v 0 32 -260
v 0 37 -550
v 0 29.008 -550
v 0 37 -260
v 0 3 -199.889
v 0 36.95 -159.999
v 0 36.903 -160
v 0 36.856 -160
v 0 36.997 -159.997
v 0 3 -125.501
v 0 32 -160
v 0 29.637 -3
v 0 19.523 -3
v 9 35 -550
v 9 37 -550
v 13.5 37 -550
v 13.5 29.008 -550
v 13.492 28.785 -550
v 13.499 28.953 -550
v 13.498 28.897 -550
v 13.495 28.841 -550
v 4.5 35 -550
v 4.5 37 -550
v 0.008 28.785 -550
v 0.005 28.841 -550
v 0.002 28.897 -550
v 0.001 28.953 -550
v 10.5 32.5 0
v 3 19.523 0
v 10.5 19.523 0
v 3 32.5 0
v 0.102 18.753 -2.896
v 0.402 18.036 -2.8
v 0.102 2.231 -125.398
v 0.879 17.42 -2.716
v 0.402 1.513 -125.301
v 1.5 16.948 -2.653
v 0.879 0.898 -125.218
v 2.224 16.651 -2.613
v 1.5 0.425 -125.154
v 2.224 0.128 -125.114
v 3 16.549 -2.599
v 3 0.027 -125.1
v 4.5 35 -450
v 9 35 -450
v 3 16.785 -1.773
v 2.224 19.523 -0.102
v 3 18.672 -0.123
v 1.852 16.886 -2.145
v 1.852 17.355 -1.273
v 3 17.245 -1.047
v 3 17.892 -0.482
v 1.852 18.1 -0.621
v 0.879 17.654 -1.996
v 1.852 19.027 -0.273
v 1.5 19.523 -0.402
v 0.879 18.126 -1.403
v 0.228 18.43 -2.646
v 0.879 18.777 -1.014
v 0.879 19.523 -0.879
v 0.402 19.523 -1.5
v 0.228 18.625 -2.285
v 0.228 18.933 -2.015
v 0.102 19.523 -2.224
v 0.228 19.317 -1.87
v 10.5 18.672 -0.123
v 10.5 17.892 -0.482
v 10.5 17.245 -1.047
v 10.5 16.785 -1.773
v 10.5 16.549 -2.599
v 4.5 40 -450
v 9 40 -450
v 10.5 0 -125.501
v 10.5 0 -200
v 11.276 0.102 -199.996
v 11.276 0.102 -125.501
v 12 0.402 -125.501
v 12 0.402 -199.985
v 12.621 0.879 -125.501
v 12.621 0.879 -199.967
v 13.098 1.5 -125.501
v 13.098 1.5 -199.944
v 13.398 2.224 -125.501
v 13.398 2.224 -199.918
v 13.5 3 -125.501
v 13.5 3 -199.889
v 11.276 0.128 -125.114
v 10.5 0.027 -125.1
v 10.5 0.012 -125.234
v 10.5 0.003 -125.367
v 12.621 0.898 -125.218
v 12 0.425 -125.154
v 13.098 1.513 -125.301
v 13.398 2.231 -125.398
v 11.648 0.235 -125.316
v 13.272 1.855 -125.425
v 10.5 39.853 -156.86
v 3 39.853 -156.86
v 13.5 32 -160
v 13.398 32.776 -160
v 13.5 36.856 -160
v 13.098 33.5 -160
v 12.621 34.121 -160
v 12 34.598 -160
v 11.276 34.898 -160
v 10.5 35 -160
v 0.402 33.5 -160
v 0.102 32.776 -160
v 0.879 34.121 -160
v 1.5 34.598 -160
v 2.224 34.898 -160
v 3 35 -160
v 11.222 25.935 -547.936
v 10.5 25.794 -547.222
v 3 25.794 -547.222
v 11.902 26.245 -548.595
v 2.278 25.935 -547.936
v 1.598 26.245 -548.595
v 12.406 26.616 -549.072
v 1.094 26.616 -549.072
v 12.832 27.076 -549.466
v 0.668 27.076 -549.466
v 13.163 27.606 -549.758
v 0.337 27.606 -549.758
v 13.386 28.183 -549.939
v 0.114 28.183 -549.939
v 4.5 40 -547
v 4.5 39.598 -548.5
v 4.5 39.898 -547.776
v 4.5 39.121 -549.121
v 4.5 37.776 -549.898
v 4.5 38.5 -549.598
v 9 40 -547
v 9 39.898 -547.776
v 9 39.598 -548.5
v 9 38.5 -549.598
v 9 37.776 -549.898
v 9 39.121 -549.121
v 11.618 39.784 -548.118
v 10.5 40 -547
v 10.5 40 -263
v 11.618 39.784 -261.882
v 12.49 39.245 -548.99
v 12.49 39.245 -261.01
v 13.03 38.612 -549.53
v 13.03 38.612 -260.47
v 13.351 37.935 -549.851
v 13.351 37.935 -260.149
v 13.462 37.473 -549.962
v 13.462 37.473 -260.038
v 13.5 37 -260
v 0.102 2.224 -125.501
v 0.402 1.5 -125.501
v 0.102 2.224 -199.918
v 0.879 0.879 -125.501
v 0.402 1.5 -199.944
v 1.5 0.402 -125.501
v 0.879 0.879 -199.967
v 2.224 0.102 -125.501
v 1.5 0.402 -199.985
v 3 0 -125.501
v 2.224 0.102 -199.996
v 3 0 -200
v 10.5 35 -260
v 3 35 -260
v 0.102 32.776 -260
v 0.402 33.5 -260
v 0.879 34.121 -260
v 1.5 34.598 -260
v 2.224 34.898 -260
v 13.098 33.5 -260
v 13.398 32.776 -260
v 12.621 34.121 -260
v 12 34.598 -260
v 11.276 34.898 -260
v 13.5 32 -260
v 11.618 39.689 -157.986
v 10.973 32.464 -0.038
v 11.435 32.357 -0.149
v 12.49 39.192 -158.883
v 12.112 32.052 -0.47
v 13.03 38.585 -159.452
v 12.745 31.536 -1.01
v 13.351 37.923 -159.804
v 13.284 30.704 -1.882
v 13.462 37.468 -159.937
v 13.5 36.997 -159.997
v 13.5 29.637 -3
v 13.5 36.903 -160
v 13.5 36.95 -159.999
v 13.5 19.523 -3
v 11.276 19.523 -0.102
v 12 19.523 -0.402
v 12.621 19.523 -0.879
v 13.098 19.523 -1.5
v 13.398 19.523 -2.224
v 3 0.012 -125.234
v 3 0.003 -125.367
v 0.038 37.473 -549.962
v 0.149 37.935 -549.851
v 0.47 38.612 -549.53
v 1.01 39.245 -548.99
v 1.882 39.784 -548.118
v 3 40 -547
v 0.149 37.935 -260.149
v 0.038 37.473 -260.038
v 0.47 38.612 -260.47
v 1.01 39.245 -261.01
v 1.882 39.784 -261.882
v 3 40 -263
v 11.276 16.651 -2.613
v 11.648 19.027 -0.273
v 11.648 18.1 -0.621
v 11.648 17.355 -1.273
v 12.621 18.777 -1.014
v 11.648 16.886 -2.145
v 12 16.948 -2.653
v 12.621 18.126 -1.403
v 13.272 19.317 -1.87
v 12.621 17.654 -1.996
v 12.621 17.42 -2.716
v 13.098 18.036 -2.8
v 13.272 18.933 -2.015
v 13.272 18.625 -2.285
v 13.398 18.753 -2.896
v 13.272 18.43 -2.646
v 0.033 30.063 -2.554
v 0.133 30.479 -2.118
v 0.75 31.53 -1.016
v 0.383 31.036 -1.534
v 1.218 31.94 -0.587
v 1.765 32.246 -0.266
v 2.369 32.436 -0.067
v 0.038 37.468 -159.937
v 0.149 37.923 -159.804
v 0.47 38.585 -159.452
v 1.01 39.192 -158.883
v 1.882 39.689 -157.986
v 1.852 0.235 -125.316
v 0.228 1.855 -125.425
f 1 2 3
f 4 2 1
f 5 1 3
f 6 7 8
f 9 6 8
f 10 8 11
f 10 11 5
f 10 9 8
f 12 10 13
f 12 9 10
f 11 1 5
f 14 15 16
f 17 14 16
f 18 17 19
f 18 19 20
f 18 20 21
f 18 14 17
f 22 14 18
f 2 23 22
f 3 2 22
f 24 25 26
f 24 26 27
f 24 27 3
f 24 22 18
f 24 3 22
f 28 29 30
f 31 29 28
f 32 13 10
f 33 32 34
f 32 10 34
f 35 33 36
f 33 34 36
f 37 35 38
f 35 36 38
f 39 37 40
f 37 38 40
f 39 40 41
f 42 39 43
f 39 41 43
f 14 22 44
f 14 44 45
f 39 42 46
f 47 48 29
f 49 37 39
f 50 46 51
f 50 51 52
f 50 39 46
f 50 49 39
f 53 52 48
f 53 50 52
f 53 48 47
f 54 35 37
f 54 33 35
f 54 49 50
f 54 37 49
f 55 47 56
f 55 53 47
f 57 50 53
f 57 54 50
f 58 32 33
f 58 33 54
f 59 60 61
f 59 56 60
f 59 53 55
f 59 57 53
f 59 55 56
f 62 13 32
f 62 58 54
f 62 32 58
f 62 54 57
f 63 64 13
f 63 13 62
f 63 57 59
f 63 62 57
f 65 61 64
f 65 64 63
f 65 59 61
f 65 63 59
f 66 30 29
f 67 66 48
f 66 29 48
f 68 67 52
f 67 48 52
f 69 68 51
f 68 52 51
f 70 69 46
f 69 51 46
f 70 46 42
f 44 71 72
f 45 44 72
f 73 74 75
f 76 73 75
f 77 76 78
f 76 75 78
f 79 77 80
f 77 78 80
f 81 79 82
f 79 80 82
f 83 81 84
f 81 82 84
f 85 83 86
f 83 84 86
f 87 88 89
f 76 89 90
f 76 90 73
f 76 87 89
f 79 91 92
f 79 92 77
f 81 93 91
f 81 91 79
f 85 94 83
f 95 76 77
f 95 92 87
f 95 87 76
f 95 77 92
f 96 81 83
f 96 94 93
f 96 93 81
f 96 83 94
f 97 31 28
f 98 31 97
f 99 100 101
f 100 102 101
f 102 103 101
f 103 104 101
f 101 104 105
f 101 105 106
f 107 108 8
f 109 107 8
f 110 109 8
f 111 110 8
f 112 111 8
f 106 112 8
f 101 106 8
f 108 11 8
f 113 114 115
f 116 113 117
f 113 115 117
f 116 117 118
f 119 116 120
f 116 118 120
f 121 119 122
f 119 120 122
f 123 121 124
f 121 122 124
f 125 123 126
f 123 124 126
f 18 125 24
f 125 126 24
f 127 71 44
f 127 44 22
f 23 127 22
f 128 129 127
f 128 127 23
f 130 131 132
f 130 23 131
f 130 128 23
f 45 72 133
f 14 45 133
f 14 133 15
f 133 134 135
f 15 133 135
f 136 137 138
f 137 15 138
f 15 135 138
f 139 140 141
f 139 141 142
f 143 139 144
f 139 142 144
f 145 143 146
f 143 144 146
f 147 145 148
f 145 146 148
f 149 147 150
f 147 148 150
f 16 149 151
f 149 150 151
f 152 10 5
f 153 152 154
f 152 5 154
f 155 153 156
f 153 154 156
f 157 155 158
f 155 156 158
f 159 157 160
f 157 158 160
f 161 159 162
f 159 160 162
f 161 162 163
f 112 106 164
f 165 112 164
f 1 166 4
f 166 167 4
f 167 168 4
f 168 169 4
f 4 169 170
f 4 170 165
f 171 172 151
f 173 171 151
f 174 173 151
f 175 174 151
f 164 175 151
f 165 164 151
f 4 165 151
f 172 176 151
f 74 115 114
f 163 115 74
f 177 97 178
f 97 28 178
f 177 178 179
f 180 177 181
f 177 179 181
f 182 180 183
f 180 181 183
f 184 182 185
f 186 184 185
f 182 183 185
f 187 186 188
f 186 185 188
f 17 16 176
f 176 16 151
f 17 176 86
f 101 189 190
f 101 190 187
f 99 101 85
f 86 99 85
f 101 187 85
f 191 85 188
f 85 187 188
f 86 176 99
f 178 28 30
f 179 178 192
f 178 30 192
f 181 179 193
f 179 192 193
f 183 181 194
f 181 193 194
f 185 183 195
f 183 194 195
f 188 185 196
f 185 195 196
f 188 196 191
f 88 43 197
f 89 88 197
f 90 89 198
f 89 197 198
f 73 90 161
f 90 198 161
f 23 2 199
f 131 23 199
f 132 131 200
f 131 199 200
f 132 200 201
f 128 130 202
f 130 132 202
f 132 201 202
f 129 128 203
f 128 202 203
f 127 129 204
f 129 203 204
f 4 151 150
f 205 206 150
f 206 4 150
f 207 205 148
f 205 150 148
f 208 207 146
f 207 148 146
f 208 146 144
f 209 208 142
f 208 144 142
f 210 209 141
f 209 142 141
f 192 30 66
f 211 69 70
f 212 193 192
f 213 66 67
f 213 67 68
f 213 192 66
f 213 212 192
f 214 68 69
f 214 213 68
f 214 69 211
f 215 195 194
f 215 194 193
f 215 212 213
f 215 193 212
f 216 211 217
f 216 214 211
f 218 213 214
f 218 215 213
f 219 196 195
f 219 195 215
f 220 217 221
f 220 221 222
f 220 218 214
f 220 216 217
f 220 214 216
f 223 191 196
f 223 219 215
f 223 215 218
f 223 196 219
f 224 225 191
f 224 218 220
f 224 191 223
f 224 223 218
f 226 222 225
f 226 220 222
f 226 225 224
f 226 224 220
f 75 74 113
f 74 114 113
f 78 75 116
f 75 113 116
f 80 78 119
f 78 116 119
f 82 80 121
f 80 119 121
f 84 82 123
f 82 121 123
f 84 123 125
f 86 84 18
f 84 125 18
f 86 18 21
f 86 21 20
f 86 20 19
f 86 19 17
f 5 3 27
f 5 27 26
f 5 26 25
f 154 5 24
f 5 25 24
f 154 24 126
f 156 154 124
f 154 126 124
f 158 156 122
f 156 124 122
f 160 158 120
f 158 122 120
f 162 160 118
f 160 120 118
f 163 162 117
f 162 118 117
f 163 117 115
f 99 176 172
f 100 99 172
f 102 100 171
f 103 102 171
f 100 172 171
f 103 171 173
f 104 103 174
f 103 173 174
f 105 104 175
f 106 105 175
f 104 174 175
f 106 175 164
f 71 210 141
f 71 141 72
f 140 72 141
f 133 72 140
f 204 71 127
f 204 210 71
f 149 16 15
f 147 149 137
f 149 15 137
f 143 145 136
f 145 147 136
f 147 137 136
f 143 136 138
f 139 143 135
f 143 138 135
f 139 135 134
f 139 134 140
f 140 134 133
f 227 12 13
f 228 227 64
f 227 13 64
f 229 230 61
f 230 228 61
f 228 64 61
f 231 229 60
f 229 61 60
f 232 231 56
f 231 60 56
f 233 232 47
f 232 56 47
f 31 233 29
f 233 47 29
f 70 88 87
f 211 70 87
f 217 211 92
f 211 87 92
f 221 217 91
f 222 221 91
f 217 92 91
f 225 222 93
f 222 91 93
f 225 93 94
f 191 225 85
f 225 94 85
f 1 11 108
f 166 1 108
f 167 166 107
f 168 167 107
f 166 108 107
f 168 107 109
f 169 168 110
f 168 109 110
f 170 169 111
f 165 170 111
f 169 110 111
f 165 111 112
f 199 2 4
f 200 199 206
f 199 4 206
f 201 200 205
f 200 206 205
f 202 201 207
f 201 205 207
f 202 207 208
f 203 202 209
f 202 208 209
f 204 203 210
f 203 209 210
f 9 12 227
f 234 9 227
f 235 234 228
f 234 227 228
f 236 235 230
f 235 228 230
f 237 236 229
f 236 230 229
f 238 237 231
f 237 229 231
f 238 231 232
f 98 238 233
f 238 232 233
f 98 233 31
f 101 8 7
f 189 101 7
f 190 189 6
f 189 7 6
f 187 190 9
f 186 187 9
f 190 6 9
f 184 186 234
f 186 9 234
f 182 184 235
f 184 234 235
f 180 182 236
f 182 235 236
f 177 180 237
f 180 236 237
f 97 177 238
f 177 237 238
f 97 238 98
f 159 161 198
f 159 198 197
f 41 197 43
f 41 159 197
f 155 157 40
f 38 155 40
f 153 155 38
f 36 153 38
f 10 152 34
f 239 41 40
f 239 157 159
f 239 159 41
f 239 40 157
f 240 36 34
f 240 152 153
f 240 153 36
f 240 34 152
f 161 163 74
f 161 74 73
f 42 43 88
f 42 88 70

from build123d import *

# Parameters (mm, degrees)
BOSS_EXTRUDE1_DEPTH = 13.5
SKETCH2_W           = 100
SKETCH2_H           = 5
CUT_EXTRUDE1_DEPTH  = 552.61784779
SKETCH3_W           = 4.5
SKETCH3_H           = 100
CUT_EXTRUDE2_DEPTH  = 5
FILLET1_R           = 3


with BuildPart() as part:
    # Sketch1 → Boss-Extrude1 (new body)
    with BuildSketch(Plane(origin=(0, 0, 0), x_dir=(0, 0, -1), z_dir=(1, 0, 0))):
        Polygon((0, 16.9), (0, 32.5), (160, 40), (550, 40), (550, 26), (200, 0), (125.3, 0), align=None)
    extrude(amount=BOSS_EXTRUDE1_DEPTH)

    # Sketch2 → Cut-Extrude1 (cut, through all)
    with BuildSketch(Plane(origin=(13.5, 0, 0), x_dir=(0, 0, -1), z_dir=(1, 0, 0))):
        with Locations((210, 37.5)):
            Rectangle(SKETCH2_W, SKETCH2_H)
    extrude(amount=-CUT_EXTRUDE1_DEPTH, mode=Mode.SUBTRACT)

    # Sketch3 → Cut-Extrude2 (cut)
    with BuildSketch(Plane(origin=(0, 40, 0), x_dir=(1, 0, 0), z_dir=(0, 1, 0))):
        with Locations((6.75, 500)):
            Rectangle(SKETCH3_W, SKETCH3_H)
    extrude(amount=-CUT_EXTRUDE2_DEPTH, mode=Mode.SUBTRACT)

    # Fillet1
    # the kernel refuses this fillet: 3 mm, written as the material it takes off along each edge
    with BuildSketch(Plane(origin=(10.5, 3, -125.501402614), x_dir=(0, -1, 0), z_dir=(1, 0, 0))) as fillet1_piece_1_section:
        Polygon((0, 0), (FILLET1_R, 0), (FILLET1_R, -FILLET1_R * 0.0671342046123), (FILLET1_R * 0.991026440985, -FILLET1_R * 0.133665976478), align=None)
    fillet1_piece_1 = extrude(amount=FILLET1_R, mode=Mode.PRIVATE)
    fillet1_piece_1 = fillet1_piece_1 - Plane(origin=(10.5, 3, -125.501402614), x_dir=(0, 0.9977540881864227, -0.0669834271091007), z_dir=(1, 0, 0)) * Sphere(FILLET1_R, mode=Mode.PRIVATE)
    add(fillet1_piece_1, mode=Mode.SUBTRACT)
    with BuildSketch(Plane(origin=(10.5, 19.522535548, -3), x_dir=(0, 0, 1), z_dir=(1, 0, 0))) as fillet1_piece_2_section:
        Polygon((0, 0), (FILLET1_R, 0), (FILLET1_R, FILLET1_R * 0.874178516025), (FILLET1_R * 0.133665976478, FILLET1_R * 0.991026440985), align=None)
    fillet1_piece_2 = extrude(amount=FILLET1_R, mode=Mode.PRIVATE)
    fillet1_piece_2 = fillet1_piece_2 - Plane(origin=(10.5, 19.522535548, -3), x_dir=(0, 0.6581542461772603, -0.75288311724918), z_dir=(1, 0, 0)) * Sphere(FILLET1_R, mode=Mode.PRIVATE)
    add(fillet1_piece_2, mode=Mode.SUBTRACT)
    with BuildSketch(Plane(origin=(3, 3, -125.501402614), x_dir=(0, -1, 0), z_dir=(-1, 0, 0))) as fillet1_piece_3_section:
        Polygon((0, 0), (FILLET1_R, 0), (FILLET1_R, FILLET1_R * 0.0671342046123), (FILLET1_R * 0.991026440985, FILLET1_R * 0.133665976478), align=None)
    fillet1_piece_3 = extrude(amount=FILLET1_R, mode=Mode.PRIVATE)
    fillet1_piece_3 = fillet1_piece_3 - Plane(origin=(3, 3, -125.501402614), x_dir=(0, 0.9977540881864227, -0.0669834271091007), z_dir=(-1, 0, 0)) * Sphere(FILLET1_R, mode=Mode.PRIVATE)
    add(fillet1_piece_3, mode=Mode.SUBTRACT)
    with BuildSketch(Plane(origin=(3, 19.522535548, -3), x_dir=(0, 0, 1), z_dir=(-1, 0, 0))) as fillet1_piece_4_section:
        Polygon((0, 0), (FILLET1_R, 0), (FILLET1_R, -FILLET1_R * 0.874178516025), (FILLET1_R * 0.133665976478, -FILLET1_R * 0.991026440985), align=None)
    fillet1_piece_4 = extrude(amount=FILLET1_R, mode=Mode.PRIVATE)
    fillet1_piece_4 = fillet1_piece_4 - Plane(origin=(3, 19.522535548, -3), x_dir=(0, 0.6581542461772603, -0.75288311724918), z_dir=(-1, 0, 0)) * Sphere(FILLET1_R, mode=Mode.PRIVATE)
    add(fillet1_piece_4, mode=Mode.SUBTRACT)
    with BuildSketch(Plane(origin=(0, 32.148823103, 7.491773808), x_dir=(1, 0, 0), z_dir=(0, 0.046823586298586156, -0.998903174369838))) as fillet1_piece_5:
        with BuildLine():
            CenterArc((FILLET1_R, FILLET1_R), FILLET1_R, 180, 90)
            Line((0, FILLET1_R), (0, 0))
            Line((0, 0), (FILLET1_R, 0))
        make_face()
    extrude(amount=175.175684796, mode=Mode.SUBTRACT)
    with BuildSketch(Plane(origin=(-7.859797725, 40, -160), x_dir=(0, -0.046823586298585164, 0.998903174369838), z_dir=(1, 0, 0))) as fillet1_piece_6:
        with BuildLine():
            CenterArc((FILLET1_R * 1.04797302998, FILLET1_R), FILLET1_R, 177.316224841, 92.683775159)
            Line((FILLET1_R * 0.0490698556077, FILLET1_R * 1.0468235863), (0, 0))
            Line((0, 0), (FILLET1_R * 1.04797302998, 0))
        make_face()
    extrude(amount=29.21959545, mode=Mode.SUBTRACT)
    with BuildSketch(Plane(origin=(1.5, 40, -550), x_dir=(0, -1, 0), z_dir=(1, 0, 0)), Plane(origin=(-7.5, 40, -550), x_dir=(0, -1, 0), z_dir=(1, 0, 0))) as fillet1_piece_7:
        with BuildLine():
            CenterArc((FILLET1_R, -FILLET1_R), FILLET1_R, 90, 90)
            Line((0, -FILLET1_R), (0, 0))
            Line((0, 0), (FILLET1_R, 0))
        make_face()
    extrude(amount=19.5, mode=Mode.SUBTRACT)
    with BuildSketch(Plane(origin=(-6.96352255, 26, -550), x_dir=(0, -0.07408159078957711, 0.9972521837058496), z_dir=(1, 0, 0))) as fillet1_piece_8:
        with BuildLine():
            CenterArc((FILLET1_R * 0.928469673307, -FILLET1_R), FILLET1_R, 90, 85.751545471)
            Line((-FILLET1_R * 0.0687825103985, -FILLET1_R * 0.92591840921), (0, 0))
            Line((0, 0), (FILLET1_R * 0.928469673307, 0))
        make_face()
    extrude(amount=27.4270451, mode=Mode.SUBTRACT)
    with BuildSketch(Plane(origin=(13.5, 0.026920677, -125.100404684), x_dir=(-1, 0, 0), z_dir=(0, 0.1336659764776849, 0.9910264409854396))) as fillet1_piece_9:
        with BuildLine():
            CenterArc((FILLET1_R, -FILLET1_R), FILLET1_R, 90, 90)
            Line((0, -FILLET1_R), (0, 0))
            Line((0, 0), (FILLET1_R, 0))
        make_face()
    extrude(amount=123.610629896, mode=Mode.SUBTRACT)
    with BuildSketch(Plane(origin=(3, 0, -125.3), x_dir=(0, 0.1336659764776861, 0.9910264409854393), z_dir=(1, 0, 0))) as fillet1_piece_10:
        with BuildLine():
            CenterArc((FILLET1_R * 0.0671342046123, -FILLET1_R), FILLET1_R, 90, 7.68148685)
            Line((-FILLET1_R * 0.0665317718654, -FILLET1_R * 0.00897355901456), (0, 0))
            Line((0, 0), (FILLET1_R * 0.0671342046123, 0))
        make_face()
    extrude(amount=7.5, mode=Mode.SUBTRACT)
    with BuildSketch(Plane(origin=(3, 16.9, 0), x_dir=(0, 1, 0), z_dir=(1, 0, 0))) as fillet1_piece_11:
        with BuildLine():
            CenterArc((FILLET1_R * 0.874178516025, -FILLET1_R), FILLET1_R, 90, 82.31851315)
            Line((-FILLET1_R * 0.11684792496, -FILLET1_R * 0.866334023522), (0, 0))
            Line((0, 0), (FILLET1_R * 0.874178516025, 0))
        make_face()
    extrude(amount=7.5, mode=Mode.SUBTRACT)
    with BuildSketch(Plane(origin=(13.5, 0, -207.5), x_dir=(0, 1, 0), z_dir=(0, 0, 1))) as fillet1_piece_12:
        with BuildLine():
            CenterArc((FILLET1_R, FILLET1_R), FILLET1_R, 180, 90)
            Line((0, FILLET1_R), (0, 0))
            Line((0, 0), (FILLET1_R, 0))
        make_face()
    extrude(amount=81.998597386, mode=Mode.SUBTRACT)
    with BuildSketch(Plane(origin=(13.5, 26.555611931, -557.479391378), x_dir=(0, 0.9972521837058497, 0.07408159078957739), z_dir=(0, -0.0740815907895774, 0.9972521837058497))) as fillet1_piece_13:
        with BuildLine():
            CenterArc((FILLET1_R, FILLET1_R), FILLET1_R, 180, 90)
            Line((0, FILLET1_R), (0, 0))
            Line((0, 0), (FILLET1_R, 0))
        make_face()
    extrude(amount=365.964385658, mode=Mode.SUBTRACT)
    with BuildSketch(Plane(origin=(21, 40, -260), x_dir=(0, 0, -1), z_dir=(-1, 0, 0))) as fillet1_piece_14:
        with BuildLine():
            CenterArc((FILLET1_R, FILLET1_R), FILLET1_R, 180, 90)
            Line((0, FILLET1_R), (0, 0))
            Line((0, 0), (FILLET1_R, 0))
        make_face()
    extrude(amount=28.5, mode=Mode.SUBTRACT)
    with BuildSketch(Plane(origin=(0, 35, -160), x_dir=(0, -1, 0), z_dir=(0, 0, -1)), Plane(origin=(13.5, 35, -260), x_dir=(0, -1, 0), z_dir=(0, 0, 1))) as fillet1_piece_15:
        with BuildLine():
            CenterArc((FILLET1_R, -FILLET1_R), FILLET1_R, 90, 90)
            Line((0, -FILLET1_R), (0, 0))
            Line((0, 0), (FILLET1_R, 0))
        make_face()
    extrude(amount=100, mode=Mode.SUBTRACT)
    with BuildSketch(Plane(origin=(13.5, 40, -252.5), x_dir=(0, -1, 0), z_dir=(0, 0, -1))) as fillet1_piece_16:
        with BuildLine():
            CenterArc((FILLET1_R, FILLET1_R), FILLET1_R, 180, 90)
            Line((0, FILLET1_R), (0, 0))
            Line((0, 0), (FILLET1_R, 0))
        make_face()
    extrude(amount=305, mode=Mode.SUBTRACT)
    with BuildSketch(Plane(origin=(13.5, 32.148823103, 7.491773808), x_dir=(-1, 0, 0), z_dir=(0, 0.046823586298586156, -0.998903174369838))) as fillet1_piece_17:
        with BuildLine():
            CenterArc((FILLET1_R, -FILLET1_R), FILLET1_R, 90, 90)
            Line((0, -FILLET1_R), (0, 0))
            Line((0, 0), (FILLET1_R, 0))
        make_face()
    extrude(amount=175.175684796, mode=Mode.SUBTRACT)
    with BuildSketch(Plane(origin=(0, 40, -252.5), x_dir=(0, -1, 0), z_dir=(0, 0, -1))) as fillet1_piece_18:
        with BuildLine():
            CenterArc((FILLET1_R, -FILLET1_R), FILLET1_R, 90, 90)
            Line((0, -FILLET1_R), (0, 0))
            Line((0, 0), (FILLET1_R, 0))
        make_face()
    extrude(amount=305, mode=Mode.SUBTRACT)
    with BuildSketch(Plane(origin=(0, 26.555611931, -557.479391378), x_dir=(0, 0.9972521837058497, 0.07408159078957739), z_dir=(0, -0.0740815907895774, 0.9972521837058497))) as fillet1_piece_19:
        with BuildLine():
            CenterArc((FILLET1_R, -FILLET1_R), FILLET1_R, 90, 90)
            Line((0, -FILLET1_R), (0, 0))
            Line((0, 0), (FILLET1_R, 0))
        make_face()
    extrude(amount=365.964385658, mode=Mode.SUBTRACT)
    with BuildSketch(Plane(origin=(0, 0, -207.5), x_dir=(0, 1, 0), z_dir=(0, 0, 1))) as fillet1_piece_20:
        with BuildLine():
            CenterArc((FILLET1_R, -FILLET1_R), FILLET1_R, 90, 90)
            Line((0, -FILLET1_R), (0, 0))
            Line((0, 0), (FILLET1_R, 0))
        make_face()
    extrude(amount=81.998597386, mode=Mode.SUBTRACT)
    with BuildSketch(Plane(origin=(13.5, 19.522535548, 0), x_dir=(-1, 0, 0), z_dir=(0, 1, 0))) as fillet1_piece_21:
        with BuildLine():
            CenterArc((FILLET1_R, -FILLET1_R), FILLET1_R, 90, 90)
            Line((0, -FILLET1_R), (0, 0))
            Line((0, 0), (FILLET1_R, 0))
        make_face()
    extrude(amount=20.477464452, mode=Mode.SUBTRACT)
    with BuildSketch(Plane(origin=(0, 0.026920677, -125.100404684), x_dir=(1, 0, 0), z_dir=(0, 0.1336659764776849, 0.9910264409854396))) as fillet1_piece_22:
        with BuildLine():
            CenterArc((FILLET1_R, FILLET1_R), FILLET1_R, 180, 90)
            Line((0, FILLET1_R), (0, 0))
            Line((0, 0), (FILLET1_R, 0))
        make_face()
    extrude(amount=123.610629896, mode=Mode.SUBTRACT)
    with BuildSketch(Plane(origin=(0, 19.522535548, 0), x_dir=(1, 0, 0), z_dir=(0, 1, 0))) as fillet1_piece_23:
        with BuildLine():
            CenterArc((FILLET1_R, FILLET1_R), FILLET1_R, 180, 90)
            Line((0, FILLET1_R), (0, 0))
            Line((0, 0), (FILLET1_R, 0))
        make_face()
    extrude(amount=20.477464452, mode=Mode.SUBTRACT)


solid = part.part
